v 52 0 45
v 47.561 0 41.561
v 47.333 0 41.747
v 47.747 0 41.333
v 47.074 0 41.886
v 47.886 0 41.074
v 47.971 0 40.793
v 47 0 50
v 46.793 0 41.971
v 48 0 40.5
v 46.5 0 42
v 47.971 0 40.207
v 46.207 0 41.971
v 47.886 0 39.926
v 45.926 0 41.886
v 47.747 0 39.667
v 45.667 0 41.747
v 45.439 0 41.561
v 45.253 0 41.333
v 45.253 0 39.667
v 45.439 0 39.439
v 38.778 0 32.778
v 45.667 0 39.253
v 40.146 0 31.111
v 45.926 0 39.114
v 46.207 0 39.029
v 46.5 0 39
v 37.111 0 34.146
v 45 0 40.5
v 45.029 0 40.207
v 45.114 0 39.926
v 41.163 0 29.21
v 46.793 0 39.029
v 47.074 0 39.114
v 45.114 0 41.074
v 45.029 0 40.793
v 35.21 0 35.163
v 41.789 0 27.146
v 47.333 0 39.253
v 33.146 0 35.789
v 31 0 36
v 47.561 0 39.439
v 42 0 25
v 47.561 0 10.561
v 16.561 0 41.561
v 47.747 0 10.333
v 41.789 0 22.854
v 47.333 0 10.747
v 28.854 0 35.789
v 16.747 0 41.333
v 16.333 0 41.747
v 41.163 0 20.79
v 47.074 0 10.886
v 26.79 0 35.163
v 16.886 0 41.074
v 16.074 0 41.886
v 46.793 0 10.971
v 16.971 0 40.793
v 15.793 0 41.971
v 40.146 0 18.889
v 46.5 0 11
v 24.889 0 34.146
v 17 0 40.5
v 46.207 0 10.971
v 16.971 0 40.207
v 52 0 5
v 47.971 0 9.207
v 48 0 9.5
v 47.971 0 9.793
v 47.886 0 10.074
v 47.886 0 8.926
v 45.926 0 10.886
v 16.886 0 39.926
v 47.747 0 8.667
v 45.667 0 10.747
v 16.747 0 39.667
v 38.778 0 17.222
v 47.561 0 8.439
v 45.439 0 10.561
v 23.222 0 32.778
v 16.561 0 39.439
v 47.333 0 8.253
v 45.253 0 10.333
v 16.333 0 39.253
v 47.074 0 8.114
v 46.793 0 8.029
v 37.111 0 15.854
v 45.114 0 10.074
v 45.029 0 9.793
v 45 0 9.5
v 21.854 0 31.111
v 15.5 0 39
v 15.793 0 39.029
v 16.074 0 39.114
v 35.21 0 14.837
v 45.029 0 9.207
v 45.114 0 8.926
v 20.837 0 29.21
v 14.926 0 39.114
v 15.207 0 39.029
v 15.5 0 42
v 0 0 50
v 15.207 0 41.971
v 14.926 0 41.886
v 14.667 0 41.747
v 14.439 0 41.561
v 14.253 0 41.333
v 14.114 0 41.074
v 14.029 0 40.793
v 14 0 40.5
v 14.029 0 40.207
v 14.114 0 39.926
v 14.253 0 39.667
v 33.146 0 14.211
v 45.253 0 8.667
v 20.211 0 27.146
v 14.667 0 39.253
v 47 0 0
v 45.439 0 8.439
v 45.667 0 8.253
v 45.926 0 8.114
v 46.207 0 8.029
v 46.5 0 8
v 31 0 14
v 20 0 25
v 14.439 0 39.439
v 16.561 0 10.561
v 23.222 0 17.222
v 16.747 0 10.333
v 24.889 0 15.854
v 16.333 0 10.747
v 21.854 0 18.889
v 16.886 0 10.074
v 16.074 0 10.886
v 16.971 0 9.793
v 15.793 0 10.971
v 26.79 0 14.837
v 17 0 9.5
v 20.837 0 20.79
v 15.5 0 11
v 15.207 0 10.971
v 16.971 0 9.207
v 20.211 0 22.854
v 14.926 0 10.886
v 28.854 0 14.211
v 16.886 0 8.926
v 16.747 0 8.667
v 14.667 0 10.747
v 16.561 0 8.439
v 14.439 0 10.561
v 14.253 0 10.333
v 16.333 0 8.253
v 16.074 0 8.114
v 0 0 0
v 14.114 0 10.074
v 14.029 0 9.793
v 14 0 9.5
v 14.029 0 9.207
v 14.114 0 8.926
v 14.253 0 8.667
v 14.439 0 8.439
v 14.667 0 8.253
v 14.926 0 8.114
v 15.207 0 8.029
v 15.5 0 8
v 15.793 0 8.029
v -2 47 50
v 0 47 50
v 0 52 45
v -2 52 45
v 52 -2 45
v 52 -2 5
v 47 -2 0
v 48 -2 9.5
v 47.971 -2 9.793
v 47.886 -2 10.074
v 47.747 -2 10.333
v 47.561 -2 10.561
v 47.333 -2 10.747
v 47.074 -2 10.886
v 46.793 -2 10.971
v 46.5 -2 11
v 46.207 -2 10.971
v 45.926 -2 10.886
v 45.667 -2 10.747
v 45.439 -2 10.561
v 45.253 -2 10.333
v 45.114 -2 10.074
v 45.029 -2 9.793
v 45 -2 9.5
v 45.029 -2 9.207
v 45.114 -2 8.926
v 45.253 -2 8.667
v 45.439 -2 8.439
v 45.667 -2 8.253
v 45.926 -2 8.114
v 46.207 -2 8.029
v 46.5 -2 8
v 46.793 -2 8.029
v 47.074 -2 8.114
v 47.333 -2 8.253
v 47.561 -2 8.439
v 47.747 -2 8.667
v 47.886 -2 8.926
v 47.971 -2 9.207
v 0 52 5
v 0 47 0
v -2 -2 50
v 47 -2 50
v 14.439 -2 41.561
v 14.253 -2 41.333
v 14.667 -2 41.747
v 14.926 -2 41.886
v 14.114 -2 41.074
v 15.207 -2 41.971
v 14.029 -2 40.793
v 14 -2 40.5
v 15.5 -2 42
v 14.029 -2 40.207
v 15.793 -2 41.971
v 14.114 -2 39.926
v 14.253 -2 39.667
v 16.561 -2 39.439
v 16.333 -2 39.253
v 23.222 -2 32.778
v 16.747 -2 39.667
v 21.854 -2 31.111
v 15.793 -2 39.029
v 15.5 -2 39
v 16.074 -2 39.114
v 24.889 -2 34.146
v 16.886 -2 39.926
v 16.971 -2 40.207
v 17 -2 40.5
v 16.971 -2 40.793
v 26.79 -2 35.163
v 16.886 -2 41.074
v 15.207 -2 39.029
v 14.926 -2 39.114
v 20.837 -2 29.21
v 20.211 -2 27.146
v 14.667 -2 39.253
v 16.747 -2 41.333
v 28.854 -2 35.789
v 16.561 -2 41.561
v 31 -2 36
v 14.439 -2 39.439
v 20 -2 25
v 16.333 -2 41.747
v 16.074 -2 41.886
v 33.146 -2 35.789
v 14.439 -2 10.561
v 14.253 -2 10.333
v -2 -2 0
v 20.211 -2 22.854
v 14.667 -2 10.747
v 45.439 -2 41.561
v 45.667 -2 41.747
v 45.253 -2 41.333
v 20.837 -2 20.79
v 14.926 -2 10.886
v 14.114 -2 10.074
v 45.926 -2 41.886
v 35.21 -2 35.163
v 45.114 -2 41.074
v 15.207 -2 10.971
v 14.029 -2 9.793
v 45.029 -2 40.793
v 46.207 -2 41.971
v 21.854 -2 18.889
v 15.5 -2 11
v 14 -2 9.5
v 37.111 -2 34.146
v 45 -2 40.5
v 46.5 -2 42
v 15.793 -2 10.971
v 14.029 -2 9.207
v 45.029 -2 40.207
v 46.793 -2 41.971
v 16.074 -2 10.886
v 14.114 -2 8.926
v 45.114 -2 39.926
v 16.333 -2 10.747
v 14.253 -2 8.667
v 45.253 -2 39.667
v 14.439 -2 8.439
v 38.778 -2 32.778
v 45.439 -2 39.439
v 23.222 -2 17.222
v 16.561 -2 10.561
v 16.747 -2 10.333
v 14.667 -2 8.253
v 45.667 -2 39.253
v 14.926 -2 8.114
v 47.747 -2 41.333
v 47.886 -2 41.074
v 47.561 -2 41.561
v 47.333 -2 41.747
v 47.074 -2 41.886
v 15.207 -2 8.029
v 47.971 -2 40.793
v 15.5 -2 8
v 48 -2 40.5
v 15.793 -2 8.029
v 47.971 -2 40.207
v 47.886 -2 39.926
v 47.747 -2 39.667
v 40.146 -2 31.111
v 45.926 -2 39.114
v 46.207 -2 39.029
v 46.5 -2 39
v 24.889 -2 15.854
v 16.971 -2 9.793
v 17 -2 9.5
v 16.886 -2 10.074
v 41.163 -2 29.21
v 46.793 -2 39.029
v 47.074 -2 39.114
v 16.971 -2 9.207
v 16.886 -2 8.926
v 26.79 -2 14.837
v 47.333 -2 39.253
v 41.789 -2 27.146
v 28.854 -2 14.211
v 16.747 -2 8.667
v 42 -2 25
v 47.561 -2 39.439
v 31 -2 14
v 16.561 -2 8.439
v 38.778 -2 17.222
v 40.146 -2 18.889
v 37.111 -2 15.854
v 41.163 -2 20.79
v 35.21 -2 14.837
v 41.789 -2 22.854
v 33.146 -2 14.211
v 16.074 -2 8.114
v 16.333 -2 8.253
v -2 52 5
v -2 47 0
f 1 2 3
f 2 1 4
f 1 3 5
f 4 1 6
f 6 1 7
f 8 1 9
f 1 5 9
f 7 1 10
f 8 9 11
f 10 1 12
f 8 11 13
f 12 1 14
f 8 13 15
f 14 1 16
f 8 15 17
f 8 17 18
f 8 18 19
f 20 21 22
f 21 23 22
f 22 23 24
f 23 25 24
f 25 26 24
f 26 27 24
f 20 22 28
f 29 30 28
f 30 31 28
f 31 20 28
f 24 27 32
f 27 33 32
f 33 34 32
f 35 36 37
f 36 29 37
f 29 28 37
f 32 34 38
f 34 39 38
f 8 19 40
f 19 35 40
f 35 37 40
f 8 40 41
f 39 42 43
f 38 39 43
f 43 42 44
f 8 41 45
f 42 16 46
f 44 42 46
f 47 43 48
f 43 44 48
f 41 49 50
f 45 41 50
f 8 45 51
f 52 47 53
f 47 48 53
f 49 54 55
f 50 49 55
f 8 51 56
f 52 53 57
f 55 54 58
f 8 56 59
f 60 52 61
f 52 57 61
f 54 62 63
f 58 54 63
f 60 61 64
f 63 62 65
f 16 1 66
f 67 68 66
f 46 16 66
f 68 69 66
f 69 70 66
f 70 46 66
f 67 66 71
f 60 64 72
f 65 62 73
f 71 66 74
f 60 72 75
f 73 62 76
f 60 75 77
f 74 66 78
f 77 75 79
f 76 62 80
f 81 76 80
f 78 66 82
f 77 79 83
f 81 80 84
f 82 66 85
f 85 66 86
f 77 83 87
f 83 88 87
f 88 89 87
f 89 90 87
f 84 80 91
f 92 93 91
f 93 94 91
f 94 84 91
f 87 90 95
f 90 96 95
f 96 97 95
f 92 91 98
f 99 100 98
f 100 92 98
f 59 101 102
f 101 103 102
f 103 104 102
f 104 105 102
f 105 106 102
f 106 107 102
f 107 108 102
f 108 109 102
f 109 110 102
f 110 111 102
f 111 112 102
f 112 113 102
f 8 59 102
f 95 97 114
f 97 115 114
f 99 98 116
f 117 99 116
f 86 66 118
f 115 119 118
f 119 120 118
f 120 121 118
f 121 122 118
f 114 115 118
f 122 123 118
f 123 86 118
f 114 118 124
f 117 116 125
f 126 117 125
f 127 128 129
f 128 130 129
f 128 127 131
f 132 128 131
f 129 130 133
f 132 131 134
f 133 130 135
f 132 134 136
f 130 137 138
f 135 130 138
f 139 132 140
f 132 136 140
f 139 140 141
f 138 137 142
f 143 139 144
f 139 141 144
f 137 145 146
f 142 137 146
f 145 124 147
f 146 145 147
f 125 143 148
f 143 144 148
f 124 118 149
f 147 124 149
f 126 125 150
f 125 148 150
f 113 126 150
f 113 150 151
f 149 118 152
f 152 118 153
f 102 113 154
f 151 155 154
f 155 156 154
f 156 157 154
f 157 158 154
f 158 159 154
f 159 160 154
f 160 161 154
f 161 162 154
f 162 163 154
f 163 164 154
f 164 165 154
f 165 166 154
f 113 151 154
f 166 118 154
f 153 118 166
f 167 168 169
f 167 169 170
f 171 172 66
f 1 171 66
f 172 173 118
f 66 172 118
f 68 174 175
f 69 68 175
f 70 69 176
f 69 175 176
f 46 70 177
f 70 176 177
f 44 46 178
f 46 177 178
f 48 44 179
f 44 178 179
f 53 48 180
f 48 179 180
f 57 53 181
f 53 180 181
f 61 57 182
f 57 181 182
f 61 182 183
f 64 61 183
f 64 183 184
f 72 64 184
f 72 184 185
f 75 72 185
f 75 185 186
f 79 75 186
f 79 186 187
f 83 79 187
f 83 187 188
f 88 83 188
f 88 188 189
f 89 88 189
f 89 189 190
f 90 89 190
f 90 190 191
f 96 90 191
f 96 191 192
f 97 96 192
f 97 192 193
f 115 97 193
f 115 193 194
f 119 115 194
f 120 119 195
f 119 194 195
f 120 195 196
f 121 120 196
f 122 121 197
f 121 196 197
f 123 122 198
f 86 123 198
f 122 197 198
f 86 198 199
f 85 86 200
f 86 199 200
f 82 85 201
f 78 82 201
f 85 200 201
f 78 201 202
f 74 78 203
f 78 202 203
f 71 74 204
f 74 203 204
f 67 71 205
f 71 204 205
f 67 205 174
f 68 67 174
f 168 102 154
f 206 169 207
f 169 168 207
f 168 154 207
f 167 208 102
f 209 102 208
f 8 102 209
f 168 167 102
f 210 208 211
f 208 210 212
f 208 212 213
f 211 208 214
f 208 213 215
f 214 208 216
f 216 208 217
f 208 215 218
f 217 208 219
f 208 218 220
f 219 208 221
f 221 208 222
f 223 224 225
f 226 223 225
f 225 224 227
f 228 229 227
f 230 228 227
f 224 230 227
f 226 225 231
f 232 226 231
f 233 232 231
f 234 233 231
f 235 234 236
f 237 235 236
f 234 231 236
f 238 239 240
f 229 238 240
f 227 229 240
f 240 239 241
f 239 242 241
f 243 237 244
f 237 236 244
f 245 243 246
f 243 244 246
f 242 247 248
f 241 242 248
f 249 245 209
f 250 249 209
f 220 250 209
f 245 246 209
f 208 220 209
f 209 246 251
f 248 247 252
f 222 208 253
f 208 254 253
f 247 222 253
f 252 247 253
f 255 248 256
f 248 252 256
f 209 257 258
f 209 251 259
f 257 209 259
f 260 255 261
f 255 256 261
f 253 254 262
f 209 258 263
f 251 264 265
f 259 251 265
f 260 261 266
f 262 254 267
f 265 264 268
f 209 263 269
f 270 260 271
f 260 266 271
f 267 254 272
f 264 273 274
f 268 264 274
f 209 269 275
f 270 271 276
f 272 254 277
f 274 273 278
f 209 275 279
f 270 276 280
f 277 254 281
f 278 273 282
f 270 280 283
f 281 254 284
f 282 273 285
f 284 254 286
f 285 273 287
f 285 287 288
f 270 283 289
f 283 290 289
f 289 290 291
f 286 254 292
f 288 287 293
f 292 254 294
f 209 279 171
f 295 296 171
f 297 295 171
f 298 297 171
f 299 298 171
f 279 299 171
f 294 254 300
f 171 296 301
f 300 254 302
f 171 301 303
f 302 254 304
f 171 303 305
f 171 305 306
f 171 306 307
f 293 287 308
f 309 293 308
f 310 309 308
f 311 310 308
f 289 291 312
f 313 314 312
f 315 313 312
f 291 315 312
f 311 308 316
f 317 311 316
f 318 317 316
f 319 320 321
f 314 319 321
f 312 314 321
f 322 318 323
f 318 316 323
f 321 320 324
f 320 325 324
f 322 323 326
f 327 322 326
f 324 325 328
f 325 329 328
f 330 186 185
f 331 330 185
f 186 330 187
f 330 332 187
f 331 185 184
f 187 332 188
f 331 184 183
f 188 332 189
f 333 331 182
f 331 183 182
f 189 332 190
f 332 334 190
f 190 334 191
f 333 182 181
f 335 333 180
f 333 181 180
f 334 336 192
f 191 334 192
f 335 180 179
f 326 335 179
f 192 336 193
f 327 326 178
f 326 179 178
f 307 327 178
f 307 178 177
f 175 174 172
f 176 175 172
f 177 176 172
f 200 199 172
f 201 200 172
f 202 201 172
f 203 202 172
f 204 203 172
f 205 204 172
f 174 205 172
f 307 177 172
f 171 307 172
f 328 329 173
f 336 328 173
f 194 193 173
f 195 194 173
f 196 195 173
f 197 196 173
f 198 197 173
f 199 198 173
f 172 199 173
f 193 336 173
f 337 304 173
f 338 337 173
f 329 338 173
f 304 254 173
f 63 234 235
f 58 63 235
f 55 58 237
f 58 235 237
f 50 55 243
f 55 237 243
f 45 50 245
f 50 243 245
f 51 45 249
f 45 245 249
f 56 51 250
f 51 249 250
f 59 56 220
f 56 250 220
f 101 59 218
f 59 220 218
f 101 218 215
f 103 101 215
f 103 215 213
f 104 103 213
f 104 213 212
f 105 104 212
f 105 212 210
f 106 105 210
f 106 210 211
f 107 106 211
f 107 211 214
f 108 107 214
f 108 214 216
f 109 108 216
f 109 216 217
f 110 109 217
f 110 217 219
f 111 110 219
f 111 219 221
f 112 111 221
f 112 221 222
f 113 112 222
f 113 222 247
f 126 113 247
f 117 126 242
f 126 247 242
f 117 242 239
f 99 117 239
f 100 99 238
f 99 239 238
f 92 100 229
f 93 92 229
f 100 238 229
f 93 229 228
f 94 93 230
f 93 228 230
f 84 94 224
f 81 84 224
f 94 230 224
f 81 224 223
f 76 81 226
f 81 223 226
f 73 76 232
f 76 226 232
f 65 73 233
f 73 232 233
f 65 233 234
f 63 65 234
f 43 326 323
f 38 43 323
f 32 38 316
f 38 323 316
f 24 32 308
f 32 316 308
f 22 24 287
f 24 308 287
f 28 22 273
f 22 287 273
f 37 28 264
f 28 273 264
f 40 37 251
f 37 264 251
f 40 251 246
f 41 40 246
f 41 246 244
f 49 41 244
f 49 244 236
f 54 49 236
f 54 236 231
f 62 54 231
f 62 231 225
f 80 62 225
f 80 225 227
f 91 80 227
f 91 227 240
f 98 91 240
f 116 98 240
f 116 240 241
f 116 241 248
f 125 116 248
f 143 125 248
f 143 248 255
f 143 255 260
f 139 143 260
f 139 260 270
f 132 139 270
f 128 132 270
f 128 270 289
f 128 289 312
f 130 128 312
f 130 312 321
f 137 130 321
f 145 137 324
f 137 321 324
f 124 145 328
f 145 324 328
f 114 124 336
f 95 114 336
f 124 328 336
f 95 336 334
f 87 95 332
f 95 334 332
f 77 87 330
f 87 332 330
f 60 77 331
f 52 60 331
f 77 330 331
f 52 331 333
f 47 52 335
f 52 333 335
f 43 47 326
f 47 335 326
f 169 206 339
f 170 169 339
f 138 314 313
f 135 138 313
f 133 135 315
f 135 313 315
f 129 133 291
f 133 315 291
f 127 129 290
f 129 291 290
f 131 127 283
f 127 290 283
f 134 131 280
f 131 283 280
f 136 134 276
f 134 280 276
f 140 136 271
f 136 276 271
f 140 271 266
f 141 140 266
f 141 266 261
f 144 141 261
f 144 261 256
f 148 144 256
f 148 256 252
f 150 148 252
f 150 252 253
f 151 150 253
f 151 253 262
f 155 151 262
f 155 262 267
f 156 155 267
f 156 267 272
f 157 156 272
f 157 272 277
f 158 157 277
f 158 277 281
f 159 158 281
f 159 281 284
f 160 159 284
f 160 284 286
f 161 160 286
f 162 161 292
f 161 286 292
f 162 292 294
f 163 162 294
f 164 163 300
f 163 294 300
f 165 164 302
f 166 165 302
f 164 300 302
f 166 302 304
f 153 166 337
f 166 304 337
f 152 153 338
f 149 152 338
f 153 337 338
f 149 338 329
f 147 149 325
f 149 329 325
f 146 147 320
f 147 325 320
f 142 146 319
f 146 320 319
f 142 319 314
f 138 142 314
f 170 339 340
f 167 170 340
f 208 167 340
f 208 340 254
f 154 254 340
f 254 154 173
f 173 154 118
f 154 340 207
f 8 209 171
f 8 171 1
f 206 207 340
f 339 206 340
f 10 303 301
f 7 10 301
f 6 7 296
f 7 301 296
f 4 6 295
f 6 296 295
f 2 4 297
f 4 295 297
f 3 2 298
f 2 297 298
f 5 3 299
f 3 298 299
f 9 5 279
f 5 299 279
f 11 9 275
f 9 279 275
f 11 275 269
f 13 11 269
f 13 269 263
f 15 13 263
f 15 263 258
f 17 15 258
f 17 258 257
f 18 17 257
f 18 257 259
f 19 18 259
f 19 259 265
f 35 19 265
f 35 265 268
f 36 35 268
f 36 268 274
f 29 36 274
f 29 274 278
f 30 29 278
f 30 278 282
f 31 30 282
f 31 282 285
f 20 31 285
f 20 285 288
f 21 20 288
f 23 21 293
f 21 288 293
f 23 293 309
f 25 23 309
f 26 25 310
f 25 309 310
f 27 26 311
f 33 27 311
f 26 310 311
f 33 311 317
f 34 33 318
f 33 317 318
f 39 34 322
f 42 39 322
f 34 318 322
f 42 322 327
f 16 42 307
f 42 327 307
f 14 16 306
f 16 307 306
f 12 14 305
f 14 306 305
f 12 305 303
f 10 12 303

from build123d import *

# Parameters (mm, degrees)
EXTRUDE_THIN1_DEPTH = 50
CHAMFER1_SIZE       = 5
SKETCH2_R           = 11
SKETCH2_R_2         = 1.5
CUT_EXTRUDE1_DEPTH  = 10


with BuildPart() as part:
    # Sketch1 → Extrude-Thin1 (new body)
    with BuildSketch(Plane.XY):
        Polygon((52, 0), (0, 0), (0, 52), (-2, 52), (-2, -2), (52, -2), align=None)
    extrude(amount=EXTRUDE_THIN1_DEPTH)

    # Chamfer1
    chamfer1_edges = [part.edges().sort_by_distance(p)[0] for p in [
        (-1, 52, 50),
        (-1, 52, 0),
        (52, -1, 0),
        (52, -1, 50),
    ]]
    chamfer(chamfer1_edges, length=CHAMFER1_SIZE)

    # Sketch2 → Cut-Extrude1 (cut)
    with BuildSketch(Plane.XZ.offset(2)):
        with Locations((31, 25)):
            Circle(SKETCH2_R)
        with Locations((15.5, 40.5)):
            Circle(SKETCH2_R_2)
        with Locations((46.5, 40.5)):
            Circle(SKETCH2_R_2)
        with Locations((46.5, 9.5)):
            Circle(SKETCH2_R_2)
        with Locations((15.5, 9.5)):
            Circle(SKETCH2_R_2)
    extrude(amount=-CUT_EXTRUDE1_DEPTH, mode=Mode.SUBTRACT)


solid = part.part
